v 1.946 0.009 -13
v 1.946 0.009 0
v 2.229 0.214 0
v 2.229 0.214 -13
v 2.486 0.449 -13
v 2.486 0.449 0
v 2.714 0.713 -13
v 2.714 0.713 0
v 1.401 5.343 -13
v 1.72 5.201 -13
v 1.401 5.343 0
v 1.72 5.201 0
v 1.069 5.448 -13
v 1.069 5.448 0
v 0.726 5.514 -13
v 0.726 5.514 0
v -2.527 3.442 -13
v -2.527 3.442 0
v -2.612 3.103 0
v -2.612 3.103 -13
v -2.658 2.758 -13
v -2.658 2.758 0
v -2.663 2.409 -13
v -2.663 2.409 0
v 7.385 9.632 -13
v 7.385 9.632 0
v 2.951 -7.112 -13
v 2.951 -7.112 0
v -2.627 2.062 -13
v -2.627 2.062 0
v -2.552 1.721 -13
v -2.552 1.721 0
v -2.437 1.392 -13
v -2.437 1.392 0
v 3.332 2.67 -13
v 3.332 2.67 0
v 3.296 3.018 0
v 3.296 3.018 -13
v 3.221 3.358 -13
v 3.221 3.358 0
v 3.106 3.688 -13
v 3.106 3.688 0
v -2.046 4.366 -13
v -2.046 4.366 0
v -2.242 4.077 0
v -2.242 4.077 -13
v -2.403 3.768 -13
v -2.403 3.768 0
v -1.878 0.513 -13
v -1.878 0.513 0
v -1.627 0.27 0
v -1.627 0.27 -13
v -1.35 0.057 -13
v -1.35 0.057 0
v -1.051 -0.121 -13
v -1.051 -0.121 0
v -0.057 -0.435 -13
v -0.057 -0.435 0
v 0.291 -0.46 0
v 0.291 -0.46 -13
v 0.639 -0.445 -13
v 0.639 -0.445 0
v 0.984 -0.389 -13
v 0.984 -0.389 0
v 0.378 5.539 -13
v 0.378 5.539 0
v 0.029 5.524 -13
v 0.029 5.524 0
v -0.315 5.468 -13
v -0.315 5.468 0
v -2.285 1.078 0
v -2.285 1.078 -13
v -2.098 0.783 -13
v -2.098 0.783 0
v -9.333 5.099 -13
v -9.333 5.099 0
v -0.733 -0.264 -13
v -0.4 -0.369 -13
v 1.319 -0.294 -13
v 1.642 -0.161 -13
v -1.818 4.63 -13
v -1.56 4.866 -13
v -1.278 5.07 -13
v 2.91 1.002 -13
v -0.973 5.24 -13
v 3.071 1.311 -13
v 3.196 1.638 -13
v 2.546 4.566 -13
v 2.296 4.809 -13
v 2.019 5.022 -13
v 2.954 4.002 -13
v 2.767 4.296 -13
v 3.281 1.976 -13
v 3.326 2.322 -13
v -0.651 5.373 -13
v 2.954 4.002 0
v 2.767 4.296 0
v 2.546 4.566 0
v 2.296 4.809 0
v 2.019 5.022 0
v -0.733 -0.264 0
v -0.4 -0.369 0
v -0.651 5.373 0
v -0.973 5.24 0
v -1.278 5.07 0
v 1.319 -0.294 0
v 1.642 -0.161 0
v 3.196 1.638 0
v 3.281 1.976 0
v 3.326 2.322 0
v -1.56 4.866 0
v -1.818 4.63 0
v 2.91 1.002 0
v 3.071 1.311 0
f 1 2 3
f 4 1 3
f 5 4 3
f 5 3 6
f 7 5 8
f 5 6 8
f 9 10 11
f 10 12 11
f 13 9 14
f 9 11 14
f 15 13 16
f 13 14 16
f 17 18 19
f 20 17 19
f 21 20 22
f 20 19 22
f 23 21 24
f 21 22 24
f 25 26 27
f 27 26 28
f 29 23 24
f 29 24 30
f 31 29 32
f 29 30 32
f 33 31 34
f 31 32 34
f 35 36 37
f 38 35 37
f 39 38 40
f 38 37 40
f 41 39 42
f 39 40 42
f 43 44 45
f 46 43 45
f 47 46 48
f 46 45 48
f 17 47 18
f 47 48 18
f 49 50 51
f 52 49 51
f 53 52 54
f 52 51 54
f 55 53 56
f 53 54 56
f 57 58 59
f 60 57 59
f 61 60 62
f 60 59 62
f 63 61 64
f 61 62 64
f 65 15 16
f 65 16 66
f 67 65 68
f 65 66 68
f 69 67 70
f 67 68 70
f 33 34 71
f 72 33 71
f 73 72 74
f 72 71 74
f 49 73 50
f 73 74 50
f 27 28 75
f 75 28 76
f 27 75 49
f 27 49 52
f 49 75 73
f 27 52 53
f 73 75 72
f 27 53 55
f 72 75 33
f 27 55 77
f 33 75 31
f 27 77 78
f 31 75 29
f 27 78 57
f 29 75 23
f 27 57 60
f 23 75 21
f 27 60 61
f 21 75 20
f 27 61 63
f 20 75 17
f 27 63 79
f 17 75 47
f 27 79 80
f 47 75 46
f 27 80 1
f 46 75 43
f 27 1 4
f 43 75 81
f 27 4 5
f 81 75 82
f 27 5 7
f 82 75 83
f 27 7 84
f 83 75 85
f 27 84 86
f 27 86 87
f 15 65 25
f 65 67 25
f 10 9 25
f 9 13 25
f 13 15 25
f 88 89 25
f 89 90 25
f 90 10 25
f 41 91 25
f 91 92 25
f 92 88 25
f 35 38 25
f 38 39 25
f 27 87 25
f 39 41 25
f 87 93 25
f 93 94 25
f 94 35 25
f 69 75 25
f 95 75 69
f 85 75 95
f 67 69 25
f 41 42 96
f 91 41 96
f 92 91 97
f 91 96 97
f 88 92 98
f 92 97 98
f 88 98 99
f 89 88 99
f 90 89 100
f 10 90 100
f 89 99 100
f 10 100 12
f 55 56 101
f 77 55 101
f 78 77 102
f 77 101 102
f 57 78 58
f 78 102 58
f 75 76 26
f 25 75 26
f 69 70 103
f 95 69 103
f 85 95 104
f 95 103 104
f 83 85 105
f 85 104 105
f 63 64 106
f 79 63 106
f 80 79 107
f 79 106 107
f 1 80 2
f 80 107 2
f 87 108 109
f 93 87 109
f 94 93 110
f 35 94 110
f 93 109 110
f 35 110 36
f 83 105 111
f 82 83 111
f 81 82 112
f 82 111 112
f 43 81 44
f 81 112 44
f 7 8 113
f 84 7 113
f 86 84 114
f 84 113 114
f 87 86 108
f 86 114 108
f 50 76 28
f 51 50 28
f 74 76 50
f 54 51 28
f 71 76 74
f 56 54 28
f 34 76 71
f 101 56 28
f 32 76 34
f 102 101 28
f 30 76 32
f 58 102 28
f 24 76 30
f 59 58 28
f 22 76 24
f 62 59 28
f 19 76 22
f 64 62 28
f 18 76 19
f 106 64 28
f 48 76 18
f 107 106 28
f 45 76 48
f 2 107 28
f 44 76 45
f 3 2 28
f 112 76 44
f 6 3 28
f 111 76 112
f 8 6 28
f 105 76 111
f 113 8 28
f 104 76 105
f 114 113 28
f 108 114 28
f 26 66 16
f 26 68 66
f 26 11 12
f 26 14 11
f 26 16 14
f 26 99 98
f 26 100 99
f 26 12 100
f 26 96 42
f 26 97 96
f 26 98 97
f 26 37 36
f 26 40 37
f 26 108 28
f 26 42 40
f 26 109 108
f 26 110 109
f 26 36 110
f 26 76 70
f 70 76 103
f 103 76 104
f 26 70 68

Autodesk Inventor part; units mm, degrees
ref_plane "YZ Plane" through (0, 0, 0) normal (1, 0, 0) x (0, 1, 0)
ref_plane "XZ Plane" through (0, 0, 0) normal (0, 1, 0) x (-1, 0, 0)
sketch "Sketch1" plane through (0, 0, 0) normal (0, 0, 1) x (1, 0, 0)
  line L0 (-1.6614, 3.5785) -> (-2.5268, 3.4417) projected
  line L1 (-2.0457, 4.3659) -> (-1.6614, 3.5785) projected
  line L2 (-1.1857, 4.1985) -> (-2.0457, 4.3659) projected
  line L3 (-1.2776, 5.0698) -> (-1.1857, 4.1985) projected
  line L4 (-0.5267, 4.6183) -> (-1.2776, 5.0698) projected
  line L5 (-0.315, 5.4685) -> (-0.5267, 4.6183) projected
  line L6 (-0.5267, 4.6183) -> (-0.315, 5.4685) projected
  arc A0 (-0.315, 5.4685) -> (-1.2776, 5.0698) centre (0.3343, 2.5396) ccw projected
  line L7 (-1.2776, 5.0698) -> (-0.5267, 4.6183) projected
  arc A1 (-1.2776, 5.0698) -> (-2.0457, 4.3659) centre (0.3343, 2.5396) ccw projected
  line L8 (-1.1857, 4.1985) -> (-1.2776, 5.0698) projected
  arc A2 (-1.2776, 5.0698) -> (-2.0457, 4.3659) centre (0.3343, 2.5396) ccw projected
  line L9 (-2.0457, 4.3659) -> (-1.1857, 4.1985) projected
  line L10 (-2.5268, 3.4417) -> (-1.6614, 3.5785) projected
  line L11 (-1.6614, 3.5785) -> (-2.0457, 4.3659) projected
  arc A3 (-2.0457, 4.3659) -> (-2.5268, 3.4417) centre (0.3343, 2.5396) ccw projected
  line L12 (0.2362, 4.7875) -> (0.7259, 5.5139) projected
  arc A4 (0.7259, 5.5139) -> (-0.315, 5.4685) centre (0.3343, 2.5396) ccw projected
  line L13 (-0.315, 5.4685) -> (0.2362, 4.7875) projected
  line L14 (1.0109, 4.6855) -> (1.7196, 5.2006) projected
  arc A5 (1.7196, 5.2006) -> (0.7259, 5.5139) centre (0.3343, 2.5396) ccw projected
  line L15 (0.7259, 5.5139) -> (1.0109, 4.6855) projected
  line L16 (1.7196, 5.2006) -> (1.7041, 4.3247) projected
  line L17 (1.7041, 4.3247) -> (2.5462, 4.5664) projected
  arc A6 (2.5462, 4.5664) -> (1.7196, 5.2006) centre (0.3343, 2.5396) ccw projected
  line L18 (2.5462, 4.5664) -> (2.232, 3.7485) projected
  line L19 (2.232, 3.7485) -> (3.106, 3.6877) projected
  arc A7 (3.106, 3.6877) -> (2.5462, 4.5664) centre (0.3343, 2.5396) ccw projected
  line L20 (3.106, 3.6877) -> (2.531, 3.0266) projected
  line L21 (2.531, 3.0266) -> (3.3315, 2.6705) projected
  arc A8 (3.3315, 2.6705) -> (3.106, 3.6877) centre (0.3343, 2.5396) ccw projected
  line L22 (-2.6628, 2.4087) -> (-2.632, 2.4258) projected
  line L23 (-2.632, 2.4258) -> (3.1702, 1.662) projected
  line L24 (3.1702, 1.662) -> (3.1955, 1.6375) projected
  arc A9 (3.1955, 1.6375) -> (3.3315, 2.6705) centre (0.3343, 2.5396) ccw projected
  line L25 (3.3315, 2.6705) -> (3.3007, 2.6534) projected
  line L26 (3.3007, 2.6534) -> (-2.5015, 3.4173) projected
  line L27 (-2.5015, 3.4173) -> (-2.5268, 3.4417) projected
  arc A10 (-2.5268, 3.4417) -> (-2.6628, 2.4087) centre (0.3343, 2.5396) ccw projected
  line L28 (3.1955, 1.6375) -> (2.3301, 1.5007) projected
  line L29 (2.3301, 1.5007) -> (2.7144, 0.7133) projected
  arc A11 (2.7144, 0.7133) -> (3.1955, 1.6375) centre (0.3343, 2.5396) ccw projected
  line L30 (2.7144, 0.7133) -> (1.8544, 0.8807) projected
  line L31 (1.8544, 0.8807) -> (1.9462, 0.0094) projected
  arc A12 (1.9462, 0.0094) -> (2.7144, 0.7133) centre (0.3343, 2.5396) ccw projected
  line L32 (1.1954, 0.4609) -> (0.9837, -0.3893) projected
  arc A13 (0.9837, -0.3893) -> (1.9462, 0.0094) centre (0.3343, 2.5396) ccw projected
  line L33 (1.9462, 0.0094) -> (1.1954, 0.4609) projected
  line L34 (0.4325, 0.2917) -> (-0.0572, -0.4347) projected
  arc A14 (-0.0572, -0.4347) -> (0.9837, -0.3893) centre (0.3343, 2.5396) ccw projected
  line L35 (0.9837, -0.3893) -> (0.4325, 0.2917) projected
  line L36 (-0.3422, 0.3937) -> (-1.0509, -0.1214) projected
  arc A15 (-1.0509, -0.1214) -> (-0.0572, -0.4347) centre (0.3343, 2.5396) ccw projected
  line L37 (-0.0572, -0.4347) -> (-0.3422, 0.3937) projected
  line L38 (-1.0354, 0.7546) -> (-1.8775, 0.5128) projected
  arc A16 (-1.8775, 0.5128) -> (-1.0509, -0.1214) centre (0.3343, 2.5396) ccw projected
  line L39 (-1.0509, -0.1214) -> (-1.0354, 0.7546) projected
  line L40 (-1.5633, 1.3307) -> (-2.4373, 1.3916) projected
  arc A17 (-2.4373, 1.3916) -> (-1.8775, 0.5128) centre (0.3343, 2.5396) ccw projected
  line L41 (-1.8775, 0.5128) -> (-1.5633, 1.3307) projected
  line L42 (-2.4373, 1.3916) -> (-1.8623, 2.0526) projected
  line L43 (-1.8623, 2.0526) -> (-2.6628, 2.4087) projected
  arc A18 (-2.6628, 2.4087) -> (-2.4373, 1.3916) centre (0.3343, 2.5396) ccw projected
  line L44 (2.9512, -7.1122) -> (-9.3328, 5.0993)
  line L45 (-9.3328, 5.0993) -> (7.3847, 9.6318)
  line L46 (7.3847, 9.6318) -> (2.9512, -7.1122)
  dimension "d0" = 17.321
ref_plane "Work Plane1" through (-2.6657, -0.4604, -13) normal (0, 0, -1) x (0, 1, 0)
extrude "Extrusion1" add sketch "Sketch1" against normal up to surface (13 mm away)
properties part number "HandlePotAttachmentGear"
